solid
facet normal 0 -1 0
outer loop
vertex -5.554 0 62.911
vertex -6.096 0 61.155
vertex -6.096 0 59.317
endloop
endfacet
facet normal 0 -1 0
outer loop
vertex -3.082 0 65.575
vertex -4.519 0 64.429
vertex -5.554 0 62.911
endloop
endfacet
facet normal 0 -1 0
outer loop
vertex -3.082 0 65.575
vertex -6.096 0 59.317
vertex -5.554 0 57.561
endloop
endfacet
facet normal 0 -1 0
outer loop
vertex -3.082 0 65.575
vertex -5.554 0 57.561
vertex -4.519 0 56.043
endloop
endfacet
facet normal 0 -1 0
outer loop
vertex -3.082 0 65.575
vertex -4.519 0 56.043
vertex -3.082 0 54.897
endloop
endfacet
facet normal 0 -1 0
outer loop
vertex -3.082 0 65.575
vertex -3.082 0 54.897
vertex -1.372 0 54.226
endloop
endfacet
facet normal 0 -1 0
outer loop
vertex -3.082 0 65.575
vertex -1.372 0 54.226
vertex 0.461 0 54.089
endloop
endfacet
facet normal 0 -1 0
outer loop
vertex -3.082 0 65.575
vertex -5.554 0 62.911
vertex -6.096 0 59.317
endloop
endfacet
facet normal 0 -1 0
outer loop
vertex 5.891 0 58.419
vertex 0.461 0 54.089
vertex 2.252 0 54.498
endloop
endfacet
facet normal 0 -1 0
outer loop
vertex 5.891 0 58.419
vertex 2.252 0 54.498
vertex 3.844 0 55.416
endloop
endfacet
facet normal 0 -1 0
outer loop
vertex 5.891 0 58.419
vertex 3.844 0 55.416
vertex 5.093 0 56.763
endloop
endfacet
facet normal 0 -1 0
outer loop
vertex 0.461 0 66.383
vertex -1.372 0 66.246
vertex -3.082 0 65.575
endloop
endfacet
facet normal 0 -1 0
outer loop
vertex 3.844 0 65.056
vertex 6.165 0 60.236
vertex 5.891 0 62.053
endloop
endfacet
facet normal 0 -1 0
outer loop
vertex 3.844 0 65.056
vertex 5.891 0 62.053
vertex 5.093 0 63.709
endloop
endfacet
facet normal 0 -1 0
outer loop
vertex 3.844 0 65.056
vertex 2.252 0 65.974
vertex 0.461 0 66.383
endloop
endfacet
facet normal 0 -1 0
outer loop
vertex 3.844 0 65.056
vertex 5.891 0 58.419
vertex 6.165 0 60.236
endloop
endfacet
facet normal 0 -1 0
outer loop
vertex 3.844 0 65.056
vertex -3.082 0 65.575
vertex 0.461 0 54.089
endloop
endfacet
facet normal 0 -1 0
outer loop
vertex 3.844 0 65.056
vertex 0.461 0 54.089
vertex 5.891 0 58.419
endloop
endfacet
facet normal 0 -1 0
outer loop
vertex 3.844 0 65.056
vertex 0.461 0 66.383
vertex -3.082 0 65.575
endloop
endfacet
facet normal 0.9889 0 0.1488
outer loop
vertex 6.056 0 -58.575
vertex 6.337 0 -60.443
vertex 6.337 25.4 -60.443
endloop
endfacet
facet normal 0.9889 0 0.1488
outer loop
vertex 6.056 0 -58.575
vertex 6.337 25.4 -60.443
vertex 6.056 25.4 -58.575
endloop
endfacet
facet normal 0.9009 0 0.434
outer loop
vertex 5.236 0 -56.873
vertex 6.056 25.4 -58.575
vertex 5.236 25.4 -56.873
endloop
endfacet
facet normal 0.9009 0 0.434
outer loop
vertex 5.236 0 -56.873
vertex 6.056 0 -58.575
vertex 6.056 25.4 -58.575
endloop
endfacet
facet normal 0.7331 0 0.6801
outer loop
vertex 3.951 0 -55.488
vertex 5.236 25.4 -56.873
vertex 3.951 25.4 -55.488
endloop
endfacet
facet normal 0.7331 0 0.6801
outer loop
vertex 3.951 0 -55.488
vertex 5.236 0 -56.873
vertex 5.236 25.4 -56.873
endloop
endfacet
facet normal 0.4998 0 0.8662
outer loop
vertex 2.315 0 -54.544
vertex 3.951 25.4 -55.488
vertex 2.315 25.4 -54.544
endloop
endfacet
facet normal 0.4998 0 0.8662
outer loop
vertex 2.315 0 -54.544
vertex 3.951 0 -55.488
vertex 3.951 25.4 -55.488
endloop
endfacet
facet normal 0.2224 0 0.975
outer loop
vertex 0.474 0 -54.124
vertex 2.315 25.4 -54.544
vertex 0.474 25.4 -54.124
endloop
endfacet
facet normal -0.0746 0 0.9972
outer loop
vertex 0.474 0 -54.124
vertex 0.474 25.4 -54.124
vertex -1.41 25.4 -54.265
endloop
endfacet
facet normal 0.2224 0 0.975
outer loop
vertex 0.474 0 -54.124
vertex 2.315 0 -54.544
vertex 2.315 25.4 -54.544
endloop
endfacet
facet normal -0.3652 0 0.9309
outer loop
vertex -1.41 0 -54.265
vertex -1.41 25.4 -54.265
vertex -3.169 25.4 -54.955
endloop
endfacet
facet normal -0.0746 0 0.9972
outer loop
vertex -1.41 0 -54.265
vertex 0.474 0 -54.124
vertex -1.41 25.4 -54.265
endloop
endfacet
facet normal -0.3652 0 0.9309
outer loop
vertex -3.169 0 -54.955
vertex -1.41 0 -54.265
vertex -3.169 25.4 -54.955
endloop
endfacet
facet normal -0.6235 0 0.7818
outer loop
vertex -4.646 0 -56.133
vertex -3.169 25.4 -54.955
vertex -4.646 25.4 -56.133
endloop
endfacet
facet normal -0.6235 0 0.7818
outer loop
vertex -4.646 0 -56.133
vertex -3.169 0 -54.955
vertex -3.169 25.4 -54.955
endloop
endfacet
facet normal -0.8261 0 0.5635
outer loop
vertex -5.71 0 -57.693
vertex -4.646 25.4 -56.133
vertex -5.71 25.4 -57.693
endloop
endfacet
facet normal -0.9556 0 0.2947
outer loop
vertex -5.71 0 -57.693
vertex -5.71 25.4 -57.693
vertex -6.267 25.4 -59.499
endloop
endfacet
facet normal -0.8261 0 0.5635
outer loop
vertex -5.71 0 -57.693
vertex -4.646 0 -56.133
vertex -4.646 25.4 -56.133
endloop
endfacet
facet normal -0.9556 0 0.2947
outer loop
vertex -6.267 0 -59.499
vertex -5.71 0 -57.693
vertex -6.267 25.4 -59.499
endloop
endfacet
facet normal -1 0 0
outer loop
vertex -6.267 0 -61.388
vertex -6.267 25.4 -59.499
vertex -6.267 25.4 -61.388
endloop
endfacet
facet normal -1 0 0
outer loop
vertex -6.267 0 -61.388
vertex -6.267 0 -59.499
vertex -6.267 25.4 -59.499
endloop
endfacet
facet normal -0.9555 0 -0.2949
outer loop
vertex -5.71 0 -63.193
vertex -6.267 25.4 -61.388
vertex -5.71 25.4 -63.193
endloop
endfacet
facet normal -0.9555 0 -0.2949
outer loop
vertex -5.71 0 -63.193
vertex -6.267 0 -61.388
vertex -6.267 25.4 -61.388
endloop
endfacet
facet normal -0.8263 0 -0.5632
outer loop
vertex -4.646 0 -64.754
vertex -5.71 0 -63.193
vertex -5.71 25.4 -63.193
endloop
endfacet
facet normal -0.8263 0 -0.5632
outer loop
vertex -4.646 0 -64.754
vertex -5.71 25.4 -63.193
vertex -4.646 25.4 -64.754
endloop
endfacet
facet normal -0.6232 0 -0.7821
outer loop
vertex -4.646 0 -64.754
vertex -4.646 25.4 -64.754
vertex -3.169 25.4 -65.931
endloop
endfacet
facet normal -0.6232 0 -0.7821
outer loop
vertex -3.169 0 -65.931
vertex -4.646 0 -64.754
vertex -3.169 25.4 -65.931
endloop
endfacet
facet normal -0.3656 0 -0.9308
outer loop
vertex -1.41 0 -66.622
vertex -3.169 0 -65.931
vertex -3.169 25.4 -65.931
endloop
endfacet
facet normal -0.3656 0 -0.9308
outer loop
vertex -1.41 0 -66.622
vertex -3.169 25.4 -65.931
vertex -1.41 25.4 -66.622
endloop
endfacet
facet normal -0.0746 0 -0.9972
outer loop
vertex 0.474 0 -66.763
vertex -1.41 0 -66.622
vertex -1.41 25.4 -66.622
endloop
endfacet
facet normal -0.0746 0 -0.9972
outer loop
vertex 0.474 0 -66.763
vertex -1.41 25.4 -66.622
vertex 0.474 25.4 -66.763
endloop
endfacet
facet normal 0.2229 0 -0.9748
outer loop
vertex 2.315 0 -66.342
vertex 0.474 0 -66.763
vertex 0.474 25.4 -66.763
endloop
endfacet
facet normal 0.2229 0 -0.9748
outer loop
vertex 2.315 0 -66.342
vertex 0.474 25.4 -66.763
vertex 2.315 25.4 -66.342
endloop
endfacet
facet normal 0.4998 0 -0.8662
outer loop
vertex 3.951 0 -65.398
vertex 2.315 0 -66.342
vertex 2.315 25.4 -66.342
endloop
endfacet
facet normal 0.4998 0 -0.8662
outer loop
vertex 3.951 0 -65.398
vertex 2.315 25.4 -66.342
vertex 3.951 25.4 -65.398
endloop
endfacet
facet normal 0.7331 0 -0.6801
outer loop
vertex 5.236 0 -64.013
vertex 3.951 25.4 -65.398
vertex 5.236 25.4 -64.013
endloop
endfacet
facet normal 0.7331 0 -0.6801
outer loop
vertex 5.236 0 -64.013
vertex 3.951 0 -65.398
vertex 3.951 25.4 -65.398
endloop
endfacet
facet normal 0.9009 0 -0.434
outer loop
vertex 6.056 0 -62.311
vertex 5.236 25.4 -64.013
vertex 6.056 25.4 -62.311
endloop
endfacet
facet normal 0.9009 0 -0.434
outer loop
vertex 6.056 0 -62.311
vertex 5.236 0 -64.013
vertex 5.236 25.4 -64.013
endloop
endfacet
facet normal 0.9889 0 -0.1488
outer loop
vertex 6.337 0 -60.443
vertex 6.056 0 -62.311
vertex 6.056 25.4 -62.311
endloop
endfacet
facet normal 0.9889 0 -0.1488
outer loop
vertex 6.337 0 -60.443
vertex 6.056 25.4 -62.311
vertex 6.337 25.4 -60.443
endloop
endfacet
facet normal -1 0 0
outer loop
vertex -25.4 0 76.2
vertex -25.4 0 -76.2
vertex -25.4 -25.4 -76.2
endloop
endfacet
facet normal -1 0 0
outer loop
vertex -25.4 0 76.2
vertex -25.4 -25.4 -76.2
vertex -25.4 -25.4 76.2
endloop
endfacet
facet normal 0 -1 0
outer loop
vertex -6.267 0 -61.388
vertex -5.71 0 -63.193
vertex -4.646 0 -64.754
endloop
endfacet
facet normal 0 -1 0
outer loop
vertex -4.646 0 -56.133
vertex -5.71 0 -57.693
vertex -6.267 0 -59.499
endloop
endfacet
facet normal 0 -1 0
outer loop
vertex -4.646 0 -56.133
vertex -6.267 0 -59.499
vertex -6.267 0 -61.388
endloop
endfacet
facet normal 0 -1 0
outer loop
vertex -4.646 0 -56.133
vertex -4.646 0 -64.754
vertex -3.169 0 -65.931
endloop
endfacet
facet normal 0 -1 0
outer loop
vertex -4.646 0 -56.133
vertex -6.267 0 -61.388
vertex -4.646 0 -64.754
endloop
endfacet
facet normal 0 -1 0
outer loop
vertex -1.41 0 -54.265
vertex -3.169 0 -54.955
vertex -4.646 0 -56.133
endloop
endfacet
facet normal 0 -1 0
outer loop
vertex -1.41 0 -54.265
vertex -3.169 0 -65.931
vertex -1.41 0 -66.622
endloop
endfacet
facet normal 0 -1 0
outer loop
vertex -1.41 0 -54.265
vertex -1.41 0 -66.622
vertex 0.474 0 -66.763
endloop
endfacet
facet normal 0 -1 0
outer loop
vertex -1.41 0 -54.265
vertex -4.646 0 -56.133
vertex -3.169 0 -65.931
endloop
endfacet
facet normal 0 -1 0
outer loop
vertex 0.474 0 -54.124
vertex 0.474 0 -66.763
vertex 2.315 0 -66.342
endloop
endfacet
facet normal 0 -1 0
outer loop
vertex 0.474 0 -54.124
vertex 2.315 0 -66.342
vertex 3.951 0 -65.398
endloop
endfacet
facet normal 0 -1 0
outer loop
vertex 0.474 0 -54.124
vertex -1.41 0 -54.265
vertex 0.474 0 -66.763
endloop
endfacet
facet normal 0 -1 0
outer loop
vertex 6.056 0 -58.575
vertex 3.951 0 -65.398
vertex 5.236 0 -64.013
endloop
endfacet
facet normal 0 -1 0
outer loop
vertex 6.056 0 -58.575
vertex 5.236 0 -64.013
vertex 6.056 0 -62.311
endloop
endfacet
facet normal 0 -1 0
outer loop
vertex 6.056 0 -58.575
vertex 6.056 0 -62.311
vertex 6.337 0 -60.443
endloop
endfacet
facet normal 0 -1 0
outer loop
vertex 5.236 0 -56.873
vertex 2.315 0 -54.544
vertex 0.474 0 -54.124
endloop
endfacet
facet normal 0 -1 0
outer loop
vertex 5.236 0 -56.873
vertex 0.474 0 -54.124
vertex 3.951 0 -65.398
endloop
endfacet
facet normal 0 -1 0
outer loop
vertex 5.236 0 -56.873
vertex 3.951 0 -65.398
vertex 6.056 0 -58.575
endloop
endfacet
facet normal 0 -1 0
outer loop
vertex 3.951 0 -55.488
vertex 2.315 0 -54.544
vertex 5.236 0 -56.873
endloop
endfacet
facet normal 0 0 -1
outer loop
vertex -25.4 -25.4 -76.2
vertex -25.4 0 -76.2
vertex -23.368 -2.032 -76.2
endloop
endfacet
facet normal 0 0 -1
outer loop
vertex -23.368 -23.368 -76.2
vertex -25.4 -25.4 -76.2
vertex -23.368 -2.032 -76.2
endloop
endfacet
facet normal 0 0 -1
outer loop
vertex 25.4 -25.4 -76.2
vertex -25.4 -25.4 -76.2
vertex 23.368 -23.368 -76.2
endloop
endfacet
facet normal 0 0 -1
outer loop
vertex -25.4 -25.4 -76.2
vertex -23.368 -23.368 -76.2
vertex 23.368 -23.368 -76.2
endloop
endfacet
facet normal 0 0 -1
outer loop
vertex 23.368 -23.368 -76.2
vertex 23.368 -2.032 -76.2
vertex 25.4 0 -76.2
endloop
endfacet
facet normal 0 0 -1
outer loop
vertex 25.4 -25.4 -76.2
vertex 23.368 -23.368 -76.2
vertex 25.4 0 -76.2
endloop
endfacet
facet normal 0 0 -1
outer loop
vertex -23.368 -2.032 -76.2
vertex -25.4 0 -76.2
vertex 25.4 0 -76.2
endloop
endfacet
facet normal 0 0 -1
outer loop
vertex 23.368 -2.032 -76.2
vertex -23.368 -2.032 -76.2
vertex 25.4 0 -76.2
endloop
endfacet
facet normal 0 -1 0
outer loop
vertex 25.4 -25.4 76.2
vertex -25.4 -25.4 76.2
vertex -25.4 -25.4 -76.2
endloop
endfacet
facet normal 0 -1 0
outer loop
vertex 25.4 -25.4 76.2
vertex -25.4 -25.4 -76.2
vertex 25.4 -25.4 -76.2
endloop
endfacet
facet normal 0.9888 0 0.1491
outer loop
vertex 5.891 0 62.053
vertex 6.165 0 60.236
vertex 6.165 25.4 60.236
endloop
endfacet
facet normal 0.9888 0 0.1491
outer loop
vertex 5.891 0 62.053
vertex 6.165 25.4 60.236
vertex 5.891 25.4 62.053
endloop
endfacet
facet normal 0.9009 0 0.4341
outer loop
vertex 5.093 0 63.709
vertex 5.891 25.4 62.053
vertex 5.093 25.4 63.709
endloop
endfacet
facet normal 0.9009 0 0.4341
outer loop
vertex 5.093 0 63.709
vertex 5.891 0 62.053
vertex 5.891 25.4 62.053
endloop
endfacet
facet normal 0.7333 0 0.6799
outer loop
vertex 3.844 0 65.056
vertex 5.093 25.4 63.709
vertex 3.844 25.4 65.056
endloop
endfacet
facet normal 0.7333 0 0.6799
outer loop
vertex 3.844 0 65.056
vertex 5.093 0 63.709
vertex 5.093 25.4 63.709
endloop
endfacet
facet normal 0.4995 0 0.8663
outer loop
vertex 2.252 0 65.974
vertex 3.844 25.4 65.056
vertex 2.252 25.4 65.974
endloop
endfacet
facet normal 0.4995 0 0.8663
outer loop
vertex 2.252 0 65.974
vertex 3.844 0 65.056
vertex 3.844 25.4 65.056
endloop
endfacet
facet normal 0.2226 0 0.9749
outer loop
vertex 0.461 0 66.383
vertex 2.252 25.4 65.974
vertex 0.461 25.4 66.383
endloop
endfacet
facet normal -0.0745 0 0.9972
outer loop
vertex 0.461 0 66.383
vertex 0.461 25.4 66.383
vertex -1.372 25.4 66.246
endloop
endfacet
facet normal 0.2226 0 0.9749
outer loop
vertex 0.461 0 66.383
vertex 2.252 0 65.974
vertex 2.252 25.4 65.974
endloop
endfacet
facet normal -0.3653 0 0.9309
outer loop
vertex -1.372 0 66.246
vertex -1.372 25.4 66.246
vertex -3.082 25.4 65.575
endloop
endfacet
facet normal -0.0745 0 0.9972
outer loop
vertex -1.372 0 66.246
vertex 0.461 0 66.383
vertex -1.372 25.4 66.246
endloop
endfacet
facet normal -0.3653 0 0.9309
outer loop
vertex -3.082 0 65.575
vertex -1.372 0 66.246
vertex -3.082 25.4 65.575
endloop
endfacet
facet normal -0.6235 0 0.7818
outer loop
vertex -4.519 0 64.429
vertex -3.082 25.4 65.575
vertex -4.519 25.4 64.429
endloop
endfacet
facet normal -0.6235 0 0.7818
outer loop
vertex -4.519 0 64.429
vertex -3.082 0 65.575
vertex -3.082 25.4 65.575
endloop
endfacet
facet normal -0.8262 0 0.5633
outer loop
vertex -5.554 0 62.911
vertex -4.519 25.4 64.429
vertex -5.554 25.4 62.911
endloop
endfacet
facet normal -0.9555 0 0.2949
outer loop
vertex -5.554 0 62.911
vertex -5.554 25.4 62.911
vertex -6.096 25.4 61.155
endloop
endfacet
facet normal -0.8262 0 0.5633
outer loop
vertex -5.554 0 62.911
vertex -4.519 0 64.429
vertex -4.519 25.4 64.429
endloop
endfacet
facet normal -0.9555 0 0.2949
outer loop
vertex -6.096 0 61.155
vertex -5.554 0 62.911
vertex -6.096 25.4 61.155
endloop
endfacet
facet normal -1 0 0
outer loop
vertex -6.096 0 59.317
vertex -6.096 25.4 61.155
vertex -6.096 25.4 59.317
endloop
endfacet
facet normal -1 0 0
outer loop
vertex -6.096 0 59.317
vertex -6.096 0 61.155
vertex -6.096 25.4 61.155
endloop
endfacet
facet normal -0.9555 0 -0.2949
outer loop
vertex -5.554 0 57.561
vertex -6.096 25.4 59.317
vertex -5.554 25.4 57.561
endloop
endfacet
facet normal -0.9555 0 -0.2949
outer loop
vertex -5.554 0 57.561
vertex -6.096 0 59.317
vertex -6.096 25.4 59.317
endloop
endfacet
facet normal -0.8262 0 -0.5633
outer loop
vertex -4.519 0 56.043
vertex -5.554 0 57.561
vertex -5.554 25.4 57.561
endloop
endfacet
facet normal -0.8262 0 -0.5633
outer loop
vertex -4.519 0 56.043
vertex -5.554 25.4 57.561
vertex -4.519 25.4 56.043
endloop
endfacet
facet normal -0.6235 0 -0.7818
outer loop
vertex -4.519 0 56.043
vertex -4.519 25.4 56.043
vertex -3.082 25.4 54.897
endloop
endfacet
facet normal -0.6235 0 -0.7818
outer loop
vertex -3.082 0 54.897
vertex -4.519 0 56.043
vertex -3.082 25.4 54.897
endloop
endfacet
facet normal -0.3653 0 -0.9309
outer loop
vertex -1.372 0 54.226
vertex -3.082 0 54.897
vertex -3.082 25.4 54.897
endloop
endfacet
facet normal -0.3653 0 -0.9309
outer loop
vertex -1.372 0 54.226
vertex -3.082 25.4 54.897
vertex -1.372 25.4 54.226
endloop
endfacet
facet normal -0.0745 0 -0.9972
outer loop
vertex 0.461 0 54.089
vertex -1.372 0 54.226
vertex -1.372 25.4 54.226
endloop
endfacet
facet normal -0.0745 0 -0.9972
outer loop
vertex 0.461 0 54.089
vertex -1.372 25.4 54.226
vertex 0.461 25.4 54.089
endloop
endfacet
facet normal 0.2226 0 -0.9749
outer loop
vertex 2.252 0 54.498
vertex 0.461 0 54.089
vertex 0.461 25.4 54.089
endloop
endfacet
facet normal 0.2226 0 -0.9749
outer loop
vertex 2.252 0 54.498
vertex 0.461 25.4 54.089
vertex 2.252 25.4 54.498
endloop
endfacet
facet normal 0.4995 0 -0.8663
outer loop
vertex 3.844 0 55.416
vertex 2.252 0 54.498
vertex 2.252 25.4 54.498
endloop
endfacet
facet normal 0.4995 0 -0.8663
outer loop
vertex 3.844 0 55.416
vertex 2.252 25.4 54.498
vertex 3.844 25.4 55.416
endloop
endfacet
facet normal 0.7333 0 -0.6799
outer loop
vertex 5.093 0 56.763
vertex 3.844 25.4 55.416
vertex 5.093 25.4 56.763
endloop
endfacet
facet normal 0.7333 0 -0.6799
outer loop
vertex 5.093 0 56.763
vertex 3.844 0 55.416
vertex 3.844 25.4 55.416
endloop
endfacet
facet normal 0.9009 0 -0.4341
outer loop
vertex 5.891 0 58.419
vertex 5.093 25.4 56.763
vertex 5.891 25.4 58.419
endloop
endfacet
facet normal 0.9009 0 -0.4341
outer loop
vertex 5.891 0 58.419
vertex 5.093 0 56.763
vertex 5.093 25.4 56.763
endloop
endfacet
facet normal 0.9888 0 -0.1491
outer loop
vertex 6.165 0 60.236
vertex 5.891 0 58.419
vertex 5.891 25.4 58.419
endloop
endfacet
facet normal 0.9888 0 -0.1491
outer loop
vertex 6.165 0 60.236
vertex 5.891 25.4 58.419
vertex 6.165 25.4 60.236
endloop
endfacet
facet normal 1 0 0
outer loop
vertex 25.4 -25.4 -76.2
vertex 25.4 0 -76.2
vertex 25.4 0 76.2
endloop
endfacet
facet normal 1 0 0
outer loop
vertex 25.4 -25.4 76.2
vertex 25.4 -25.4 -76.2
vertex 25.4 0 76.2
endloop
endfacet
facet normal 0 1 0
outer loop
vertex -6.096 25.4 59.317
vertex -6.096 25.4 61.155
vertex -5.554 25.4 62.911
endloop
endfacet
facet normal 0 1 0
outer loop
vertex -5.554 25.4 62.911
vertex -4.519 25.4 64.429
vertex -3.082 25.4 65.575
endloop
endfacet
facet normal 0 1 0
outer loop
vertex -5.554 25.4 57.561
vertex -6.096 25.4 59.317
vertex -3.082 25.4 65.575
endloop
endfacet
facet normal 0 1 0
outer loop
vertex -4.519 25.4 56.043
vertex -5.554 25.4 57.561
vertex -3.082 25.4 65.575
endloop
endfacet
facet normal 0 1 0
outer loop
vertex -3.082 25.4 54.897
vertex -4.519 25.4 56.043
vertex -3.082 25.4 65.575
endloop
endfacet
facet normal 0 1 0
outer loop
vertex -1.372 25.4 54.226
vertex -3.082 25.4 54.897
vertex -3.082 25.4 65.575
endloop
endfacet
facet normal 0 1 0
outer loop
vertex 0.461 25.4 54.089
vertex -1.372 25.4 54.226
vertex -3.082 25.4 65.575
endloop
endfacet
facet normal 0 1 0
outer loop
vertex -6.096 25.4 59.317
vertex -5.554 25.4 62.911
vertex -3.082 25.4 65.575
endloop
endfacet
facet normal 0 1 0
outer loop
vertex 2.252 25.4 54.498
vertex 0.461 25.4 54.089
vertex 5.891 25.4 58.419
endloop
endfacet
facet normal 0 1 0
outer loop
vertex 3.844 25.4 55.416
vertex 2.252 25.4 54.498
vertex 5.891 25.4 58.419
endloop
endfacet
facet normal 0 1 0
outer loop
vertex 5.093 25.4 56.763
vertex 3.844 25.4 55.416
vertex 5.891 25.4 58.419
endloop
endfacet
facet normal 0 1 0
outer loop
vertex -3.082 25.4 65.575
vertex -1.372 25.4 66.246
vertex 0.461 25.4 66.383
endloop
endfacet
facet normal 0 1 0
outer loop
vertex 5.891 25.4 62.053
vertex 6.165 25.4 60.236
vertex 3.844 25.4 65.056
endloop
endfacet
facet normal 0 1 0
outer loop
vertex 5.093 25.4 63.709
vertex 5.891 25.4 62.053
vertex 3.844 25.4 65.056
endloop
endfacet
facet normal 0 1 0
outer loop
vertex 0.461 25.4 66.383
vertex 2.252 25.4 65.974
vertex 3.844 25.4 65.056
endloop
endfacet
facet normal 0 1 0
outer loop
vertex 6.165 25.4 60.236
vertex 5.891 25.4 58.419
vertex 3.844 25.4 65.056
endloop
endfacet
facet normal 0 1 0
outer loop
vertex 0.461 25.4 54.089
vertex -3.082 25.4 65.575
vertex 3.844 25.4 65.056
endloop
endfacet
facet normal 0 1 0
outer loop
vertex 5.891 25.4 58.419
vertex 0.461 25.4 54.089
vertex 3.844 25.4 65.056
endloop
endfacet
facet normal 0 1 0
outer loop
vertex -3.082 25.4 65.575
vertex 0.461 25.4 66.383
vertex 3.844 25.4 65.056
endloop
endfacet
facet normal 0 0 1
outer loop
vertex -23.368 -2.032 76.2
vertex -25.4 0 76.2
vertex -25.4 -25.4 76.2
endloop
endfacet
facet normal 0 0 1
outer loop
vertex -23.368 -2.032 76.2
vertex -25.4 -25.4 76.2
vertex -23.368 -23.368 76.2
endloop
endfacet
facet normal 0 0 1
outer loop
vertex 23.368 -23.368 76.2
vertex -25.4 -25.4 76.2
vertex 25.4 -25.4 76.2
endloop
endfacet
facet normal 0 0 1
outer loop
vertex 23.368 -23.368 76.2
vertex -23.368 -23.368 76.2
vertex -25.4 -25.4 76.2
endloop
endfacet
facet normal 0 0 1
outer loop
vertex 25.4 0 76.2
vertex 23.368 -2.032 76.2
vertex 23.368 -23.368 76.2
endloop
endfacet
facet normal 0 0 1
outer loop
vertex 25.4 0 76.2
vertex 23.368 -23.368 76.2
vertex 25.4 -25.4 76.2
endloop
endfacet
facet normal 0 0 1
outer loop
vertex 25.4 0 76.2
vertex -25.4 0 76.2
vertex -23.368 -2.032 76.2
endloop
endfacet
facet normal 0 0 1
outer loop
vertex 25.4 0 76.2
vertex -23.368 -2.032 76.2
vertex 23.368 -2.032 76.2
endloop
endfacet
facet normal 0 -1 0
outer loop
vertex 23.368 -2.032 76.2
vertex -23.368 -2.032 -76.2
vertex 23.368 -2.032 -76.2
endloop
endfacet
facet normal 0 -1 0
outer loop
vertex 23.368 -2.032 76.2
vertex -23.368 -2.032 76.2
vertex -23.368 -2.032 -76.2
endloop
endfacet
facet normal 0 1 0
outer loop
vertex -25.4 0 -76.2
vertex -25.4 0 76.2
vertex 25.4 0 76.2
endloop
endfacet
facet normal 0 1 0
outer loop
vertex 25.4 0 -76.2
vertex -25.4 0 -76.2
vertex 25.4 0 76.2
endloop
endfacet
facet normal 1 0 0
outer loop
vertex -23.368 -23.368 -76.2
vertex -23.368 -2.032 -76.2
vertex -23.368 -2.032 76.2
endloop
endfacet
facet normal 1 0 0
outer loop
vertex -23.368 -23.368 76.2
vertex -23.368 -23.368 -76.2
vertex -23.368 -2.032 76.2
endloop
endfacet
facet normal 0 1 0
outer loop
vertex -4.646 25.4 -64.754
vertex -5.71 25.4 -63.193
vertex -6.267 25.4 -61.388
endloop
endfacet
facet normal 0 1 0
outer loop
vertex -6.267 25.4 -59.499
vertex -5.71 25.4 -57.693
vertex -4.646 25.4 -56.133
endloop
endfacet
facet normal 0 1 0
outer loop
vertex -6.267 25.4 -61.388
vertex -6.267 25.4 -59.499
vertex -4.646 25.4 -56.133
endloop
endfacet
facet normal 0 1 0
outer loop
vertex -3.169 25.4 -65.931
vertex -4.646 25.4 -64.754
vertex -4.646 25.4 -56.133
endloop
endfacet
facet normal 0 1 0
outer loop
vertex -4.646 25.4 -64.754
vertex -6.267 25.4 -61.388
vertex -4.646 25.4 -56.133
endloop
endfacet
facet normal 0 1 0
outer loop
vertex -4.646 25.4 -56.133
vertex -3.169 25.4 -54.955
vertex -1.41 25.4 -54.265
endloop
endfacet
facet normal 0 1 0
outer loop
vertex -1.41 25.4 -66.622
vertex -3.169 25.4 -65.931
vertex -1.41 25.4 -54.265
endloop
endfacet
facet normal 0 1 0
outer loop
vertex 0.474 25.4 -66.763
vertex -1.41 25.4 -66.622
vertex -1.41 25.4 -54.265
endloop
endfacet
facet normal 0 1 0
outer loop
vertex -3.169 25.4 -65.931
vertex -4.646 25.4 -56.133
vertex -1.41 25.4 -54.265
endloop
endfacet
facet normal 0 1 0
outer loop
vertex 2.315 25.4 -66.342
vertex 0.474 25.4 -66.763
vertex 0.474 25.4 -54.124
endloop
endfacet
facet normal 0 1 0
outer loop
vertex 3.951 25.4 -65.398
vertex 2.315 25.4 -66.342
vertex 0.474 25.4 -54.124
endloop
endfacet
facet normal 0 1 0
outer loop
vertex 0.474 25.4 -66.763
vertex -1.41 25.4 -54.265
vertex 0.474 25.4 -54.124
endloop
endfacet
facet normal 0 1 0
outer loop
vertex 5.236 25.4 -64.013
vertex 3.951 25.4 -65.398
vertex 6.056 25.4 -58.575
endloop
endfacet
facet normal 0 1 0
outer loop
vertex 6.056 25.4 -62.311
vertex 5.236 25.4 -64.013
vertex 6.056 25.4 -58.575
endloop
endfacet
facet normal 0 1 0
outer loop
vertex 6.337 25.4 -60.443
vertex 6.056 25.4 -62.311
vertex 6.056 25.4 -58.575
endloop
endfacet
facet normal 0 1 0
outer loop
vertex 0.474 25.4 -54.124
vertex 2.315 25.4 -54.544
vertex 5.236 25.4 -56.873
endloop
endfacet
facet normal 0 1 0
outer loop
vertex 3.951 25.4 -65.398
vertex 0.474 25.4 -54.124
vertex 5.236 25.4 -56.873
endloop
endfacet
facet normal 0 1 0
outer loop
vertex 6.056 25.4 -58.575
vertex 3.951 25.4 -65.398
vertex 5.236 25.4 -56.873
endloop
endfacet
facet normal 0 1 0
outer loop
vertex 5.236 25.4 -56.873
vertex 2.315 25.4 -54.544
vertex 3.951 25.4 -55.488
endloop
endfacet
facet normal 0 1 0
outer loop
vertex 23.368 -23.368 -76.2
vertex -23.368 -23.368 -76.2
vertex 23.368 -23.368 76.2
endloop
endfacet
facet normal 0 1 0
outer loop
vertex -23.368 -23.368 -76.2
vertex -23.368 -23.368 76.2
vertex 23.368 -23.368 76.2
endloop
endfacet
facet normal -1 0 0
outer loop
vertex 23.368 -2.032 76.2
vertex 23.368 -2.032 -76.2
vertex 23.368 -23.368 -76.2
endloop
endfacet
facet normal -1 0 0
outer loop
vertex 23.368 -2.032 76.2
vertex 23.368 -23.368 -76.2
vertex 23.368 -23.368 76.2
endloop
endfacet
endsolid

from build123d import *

# Parameters (mm, degrees)
F0_R     = 6.3373
F1_DEPTH = 25.4
F0_R_2   = 6.1645080195
F2_W     = 50.8
F2_H     = 152.4
F3_DEPTH = 25.4
F4_T     = -2.032


# Not quite as in the source:
# - a feature names something its author has since deleted; it is built from what else it names


with BuildPart() as f1:
    # F0 (on Front) → F1 (new body)
    with BuildSketch(Plane.XZ):
        with Locations((0, -60.4431070387)):
            Circle(F0_R)
    extrude(amount=-F1_DEPTH)


with BuildPart() as f1b:
    # F0 (on Front) → F1, piece 2 (new body)
    with BuildSketch(Plane.XZ):
        with Locations((0, 60.2359361947)):
            Circle(F0_R_2)
    extrude(amount=-F1_DEPTH)


with BuildPart() as f3:
    # F2 (on Front) → F3 (new body)
    with BuildSketch(Plane.XZ):
        Rectangle(F2_W, F2_H)
    extrude(amount=F3_DEPTH)

    # F4
    f4_openings = [f3.faces().sort_by_distance(p)[0] for p in [
        (0, -12.7, 76.2),
        (0, -12.7, -76.2),
    ]]
    offset(amount=F4_T, openings=f4_openings)


solid = Compound([f1.part, f1b.part, f3.part])
